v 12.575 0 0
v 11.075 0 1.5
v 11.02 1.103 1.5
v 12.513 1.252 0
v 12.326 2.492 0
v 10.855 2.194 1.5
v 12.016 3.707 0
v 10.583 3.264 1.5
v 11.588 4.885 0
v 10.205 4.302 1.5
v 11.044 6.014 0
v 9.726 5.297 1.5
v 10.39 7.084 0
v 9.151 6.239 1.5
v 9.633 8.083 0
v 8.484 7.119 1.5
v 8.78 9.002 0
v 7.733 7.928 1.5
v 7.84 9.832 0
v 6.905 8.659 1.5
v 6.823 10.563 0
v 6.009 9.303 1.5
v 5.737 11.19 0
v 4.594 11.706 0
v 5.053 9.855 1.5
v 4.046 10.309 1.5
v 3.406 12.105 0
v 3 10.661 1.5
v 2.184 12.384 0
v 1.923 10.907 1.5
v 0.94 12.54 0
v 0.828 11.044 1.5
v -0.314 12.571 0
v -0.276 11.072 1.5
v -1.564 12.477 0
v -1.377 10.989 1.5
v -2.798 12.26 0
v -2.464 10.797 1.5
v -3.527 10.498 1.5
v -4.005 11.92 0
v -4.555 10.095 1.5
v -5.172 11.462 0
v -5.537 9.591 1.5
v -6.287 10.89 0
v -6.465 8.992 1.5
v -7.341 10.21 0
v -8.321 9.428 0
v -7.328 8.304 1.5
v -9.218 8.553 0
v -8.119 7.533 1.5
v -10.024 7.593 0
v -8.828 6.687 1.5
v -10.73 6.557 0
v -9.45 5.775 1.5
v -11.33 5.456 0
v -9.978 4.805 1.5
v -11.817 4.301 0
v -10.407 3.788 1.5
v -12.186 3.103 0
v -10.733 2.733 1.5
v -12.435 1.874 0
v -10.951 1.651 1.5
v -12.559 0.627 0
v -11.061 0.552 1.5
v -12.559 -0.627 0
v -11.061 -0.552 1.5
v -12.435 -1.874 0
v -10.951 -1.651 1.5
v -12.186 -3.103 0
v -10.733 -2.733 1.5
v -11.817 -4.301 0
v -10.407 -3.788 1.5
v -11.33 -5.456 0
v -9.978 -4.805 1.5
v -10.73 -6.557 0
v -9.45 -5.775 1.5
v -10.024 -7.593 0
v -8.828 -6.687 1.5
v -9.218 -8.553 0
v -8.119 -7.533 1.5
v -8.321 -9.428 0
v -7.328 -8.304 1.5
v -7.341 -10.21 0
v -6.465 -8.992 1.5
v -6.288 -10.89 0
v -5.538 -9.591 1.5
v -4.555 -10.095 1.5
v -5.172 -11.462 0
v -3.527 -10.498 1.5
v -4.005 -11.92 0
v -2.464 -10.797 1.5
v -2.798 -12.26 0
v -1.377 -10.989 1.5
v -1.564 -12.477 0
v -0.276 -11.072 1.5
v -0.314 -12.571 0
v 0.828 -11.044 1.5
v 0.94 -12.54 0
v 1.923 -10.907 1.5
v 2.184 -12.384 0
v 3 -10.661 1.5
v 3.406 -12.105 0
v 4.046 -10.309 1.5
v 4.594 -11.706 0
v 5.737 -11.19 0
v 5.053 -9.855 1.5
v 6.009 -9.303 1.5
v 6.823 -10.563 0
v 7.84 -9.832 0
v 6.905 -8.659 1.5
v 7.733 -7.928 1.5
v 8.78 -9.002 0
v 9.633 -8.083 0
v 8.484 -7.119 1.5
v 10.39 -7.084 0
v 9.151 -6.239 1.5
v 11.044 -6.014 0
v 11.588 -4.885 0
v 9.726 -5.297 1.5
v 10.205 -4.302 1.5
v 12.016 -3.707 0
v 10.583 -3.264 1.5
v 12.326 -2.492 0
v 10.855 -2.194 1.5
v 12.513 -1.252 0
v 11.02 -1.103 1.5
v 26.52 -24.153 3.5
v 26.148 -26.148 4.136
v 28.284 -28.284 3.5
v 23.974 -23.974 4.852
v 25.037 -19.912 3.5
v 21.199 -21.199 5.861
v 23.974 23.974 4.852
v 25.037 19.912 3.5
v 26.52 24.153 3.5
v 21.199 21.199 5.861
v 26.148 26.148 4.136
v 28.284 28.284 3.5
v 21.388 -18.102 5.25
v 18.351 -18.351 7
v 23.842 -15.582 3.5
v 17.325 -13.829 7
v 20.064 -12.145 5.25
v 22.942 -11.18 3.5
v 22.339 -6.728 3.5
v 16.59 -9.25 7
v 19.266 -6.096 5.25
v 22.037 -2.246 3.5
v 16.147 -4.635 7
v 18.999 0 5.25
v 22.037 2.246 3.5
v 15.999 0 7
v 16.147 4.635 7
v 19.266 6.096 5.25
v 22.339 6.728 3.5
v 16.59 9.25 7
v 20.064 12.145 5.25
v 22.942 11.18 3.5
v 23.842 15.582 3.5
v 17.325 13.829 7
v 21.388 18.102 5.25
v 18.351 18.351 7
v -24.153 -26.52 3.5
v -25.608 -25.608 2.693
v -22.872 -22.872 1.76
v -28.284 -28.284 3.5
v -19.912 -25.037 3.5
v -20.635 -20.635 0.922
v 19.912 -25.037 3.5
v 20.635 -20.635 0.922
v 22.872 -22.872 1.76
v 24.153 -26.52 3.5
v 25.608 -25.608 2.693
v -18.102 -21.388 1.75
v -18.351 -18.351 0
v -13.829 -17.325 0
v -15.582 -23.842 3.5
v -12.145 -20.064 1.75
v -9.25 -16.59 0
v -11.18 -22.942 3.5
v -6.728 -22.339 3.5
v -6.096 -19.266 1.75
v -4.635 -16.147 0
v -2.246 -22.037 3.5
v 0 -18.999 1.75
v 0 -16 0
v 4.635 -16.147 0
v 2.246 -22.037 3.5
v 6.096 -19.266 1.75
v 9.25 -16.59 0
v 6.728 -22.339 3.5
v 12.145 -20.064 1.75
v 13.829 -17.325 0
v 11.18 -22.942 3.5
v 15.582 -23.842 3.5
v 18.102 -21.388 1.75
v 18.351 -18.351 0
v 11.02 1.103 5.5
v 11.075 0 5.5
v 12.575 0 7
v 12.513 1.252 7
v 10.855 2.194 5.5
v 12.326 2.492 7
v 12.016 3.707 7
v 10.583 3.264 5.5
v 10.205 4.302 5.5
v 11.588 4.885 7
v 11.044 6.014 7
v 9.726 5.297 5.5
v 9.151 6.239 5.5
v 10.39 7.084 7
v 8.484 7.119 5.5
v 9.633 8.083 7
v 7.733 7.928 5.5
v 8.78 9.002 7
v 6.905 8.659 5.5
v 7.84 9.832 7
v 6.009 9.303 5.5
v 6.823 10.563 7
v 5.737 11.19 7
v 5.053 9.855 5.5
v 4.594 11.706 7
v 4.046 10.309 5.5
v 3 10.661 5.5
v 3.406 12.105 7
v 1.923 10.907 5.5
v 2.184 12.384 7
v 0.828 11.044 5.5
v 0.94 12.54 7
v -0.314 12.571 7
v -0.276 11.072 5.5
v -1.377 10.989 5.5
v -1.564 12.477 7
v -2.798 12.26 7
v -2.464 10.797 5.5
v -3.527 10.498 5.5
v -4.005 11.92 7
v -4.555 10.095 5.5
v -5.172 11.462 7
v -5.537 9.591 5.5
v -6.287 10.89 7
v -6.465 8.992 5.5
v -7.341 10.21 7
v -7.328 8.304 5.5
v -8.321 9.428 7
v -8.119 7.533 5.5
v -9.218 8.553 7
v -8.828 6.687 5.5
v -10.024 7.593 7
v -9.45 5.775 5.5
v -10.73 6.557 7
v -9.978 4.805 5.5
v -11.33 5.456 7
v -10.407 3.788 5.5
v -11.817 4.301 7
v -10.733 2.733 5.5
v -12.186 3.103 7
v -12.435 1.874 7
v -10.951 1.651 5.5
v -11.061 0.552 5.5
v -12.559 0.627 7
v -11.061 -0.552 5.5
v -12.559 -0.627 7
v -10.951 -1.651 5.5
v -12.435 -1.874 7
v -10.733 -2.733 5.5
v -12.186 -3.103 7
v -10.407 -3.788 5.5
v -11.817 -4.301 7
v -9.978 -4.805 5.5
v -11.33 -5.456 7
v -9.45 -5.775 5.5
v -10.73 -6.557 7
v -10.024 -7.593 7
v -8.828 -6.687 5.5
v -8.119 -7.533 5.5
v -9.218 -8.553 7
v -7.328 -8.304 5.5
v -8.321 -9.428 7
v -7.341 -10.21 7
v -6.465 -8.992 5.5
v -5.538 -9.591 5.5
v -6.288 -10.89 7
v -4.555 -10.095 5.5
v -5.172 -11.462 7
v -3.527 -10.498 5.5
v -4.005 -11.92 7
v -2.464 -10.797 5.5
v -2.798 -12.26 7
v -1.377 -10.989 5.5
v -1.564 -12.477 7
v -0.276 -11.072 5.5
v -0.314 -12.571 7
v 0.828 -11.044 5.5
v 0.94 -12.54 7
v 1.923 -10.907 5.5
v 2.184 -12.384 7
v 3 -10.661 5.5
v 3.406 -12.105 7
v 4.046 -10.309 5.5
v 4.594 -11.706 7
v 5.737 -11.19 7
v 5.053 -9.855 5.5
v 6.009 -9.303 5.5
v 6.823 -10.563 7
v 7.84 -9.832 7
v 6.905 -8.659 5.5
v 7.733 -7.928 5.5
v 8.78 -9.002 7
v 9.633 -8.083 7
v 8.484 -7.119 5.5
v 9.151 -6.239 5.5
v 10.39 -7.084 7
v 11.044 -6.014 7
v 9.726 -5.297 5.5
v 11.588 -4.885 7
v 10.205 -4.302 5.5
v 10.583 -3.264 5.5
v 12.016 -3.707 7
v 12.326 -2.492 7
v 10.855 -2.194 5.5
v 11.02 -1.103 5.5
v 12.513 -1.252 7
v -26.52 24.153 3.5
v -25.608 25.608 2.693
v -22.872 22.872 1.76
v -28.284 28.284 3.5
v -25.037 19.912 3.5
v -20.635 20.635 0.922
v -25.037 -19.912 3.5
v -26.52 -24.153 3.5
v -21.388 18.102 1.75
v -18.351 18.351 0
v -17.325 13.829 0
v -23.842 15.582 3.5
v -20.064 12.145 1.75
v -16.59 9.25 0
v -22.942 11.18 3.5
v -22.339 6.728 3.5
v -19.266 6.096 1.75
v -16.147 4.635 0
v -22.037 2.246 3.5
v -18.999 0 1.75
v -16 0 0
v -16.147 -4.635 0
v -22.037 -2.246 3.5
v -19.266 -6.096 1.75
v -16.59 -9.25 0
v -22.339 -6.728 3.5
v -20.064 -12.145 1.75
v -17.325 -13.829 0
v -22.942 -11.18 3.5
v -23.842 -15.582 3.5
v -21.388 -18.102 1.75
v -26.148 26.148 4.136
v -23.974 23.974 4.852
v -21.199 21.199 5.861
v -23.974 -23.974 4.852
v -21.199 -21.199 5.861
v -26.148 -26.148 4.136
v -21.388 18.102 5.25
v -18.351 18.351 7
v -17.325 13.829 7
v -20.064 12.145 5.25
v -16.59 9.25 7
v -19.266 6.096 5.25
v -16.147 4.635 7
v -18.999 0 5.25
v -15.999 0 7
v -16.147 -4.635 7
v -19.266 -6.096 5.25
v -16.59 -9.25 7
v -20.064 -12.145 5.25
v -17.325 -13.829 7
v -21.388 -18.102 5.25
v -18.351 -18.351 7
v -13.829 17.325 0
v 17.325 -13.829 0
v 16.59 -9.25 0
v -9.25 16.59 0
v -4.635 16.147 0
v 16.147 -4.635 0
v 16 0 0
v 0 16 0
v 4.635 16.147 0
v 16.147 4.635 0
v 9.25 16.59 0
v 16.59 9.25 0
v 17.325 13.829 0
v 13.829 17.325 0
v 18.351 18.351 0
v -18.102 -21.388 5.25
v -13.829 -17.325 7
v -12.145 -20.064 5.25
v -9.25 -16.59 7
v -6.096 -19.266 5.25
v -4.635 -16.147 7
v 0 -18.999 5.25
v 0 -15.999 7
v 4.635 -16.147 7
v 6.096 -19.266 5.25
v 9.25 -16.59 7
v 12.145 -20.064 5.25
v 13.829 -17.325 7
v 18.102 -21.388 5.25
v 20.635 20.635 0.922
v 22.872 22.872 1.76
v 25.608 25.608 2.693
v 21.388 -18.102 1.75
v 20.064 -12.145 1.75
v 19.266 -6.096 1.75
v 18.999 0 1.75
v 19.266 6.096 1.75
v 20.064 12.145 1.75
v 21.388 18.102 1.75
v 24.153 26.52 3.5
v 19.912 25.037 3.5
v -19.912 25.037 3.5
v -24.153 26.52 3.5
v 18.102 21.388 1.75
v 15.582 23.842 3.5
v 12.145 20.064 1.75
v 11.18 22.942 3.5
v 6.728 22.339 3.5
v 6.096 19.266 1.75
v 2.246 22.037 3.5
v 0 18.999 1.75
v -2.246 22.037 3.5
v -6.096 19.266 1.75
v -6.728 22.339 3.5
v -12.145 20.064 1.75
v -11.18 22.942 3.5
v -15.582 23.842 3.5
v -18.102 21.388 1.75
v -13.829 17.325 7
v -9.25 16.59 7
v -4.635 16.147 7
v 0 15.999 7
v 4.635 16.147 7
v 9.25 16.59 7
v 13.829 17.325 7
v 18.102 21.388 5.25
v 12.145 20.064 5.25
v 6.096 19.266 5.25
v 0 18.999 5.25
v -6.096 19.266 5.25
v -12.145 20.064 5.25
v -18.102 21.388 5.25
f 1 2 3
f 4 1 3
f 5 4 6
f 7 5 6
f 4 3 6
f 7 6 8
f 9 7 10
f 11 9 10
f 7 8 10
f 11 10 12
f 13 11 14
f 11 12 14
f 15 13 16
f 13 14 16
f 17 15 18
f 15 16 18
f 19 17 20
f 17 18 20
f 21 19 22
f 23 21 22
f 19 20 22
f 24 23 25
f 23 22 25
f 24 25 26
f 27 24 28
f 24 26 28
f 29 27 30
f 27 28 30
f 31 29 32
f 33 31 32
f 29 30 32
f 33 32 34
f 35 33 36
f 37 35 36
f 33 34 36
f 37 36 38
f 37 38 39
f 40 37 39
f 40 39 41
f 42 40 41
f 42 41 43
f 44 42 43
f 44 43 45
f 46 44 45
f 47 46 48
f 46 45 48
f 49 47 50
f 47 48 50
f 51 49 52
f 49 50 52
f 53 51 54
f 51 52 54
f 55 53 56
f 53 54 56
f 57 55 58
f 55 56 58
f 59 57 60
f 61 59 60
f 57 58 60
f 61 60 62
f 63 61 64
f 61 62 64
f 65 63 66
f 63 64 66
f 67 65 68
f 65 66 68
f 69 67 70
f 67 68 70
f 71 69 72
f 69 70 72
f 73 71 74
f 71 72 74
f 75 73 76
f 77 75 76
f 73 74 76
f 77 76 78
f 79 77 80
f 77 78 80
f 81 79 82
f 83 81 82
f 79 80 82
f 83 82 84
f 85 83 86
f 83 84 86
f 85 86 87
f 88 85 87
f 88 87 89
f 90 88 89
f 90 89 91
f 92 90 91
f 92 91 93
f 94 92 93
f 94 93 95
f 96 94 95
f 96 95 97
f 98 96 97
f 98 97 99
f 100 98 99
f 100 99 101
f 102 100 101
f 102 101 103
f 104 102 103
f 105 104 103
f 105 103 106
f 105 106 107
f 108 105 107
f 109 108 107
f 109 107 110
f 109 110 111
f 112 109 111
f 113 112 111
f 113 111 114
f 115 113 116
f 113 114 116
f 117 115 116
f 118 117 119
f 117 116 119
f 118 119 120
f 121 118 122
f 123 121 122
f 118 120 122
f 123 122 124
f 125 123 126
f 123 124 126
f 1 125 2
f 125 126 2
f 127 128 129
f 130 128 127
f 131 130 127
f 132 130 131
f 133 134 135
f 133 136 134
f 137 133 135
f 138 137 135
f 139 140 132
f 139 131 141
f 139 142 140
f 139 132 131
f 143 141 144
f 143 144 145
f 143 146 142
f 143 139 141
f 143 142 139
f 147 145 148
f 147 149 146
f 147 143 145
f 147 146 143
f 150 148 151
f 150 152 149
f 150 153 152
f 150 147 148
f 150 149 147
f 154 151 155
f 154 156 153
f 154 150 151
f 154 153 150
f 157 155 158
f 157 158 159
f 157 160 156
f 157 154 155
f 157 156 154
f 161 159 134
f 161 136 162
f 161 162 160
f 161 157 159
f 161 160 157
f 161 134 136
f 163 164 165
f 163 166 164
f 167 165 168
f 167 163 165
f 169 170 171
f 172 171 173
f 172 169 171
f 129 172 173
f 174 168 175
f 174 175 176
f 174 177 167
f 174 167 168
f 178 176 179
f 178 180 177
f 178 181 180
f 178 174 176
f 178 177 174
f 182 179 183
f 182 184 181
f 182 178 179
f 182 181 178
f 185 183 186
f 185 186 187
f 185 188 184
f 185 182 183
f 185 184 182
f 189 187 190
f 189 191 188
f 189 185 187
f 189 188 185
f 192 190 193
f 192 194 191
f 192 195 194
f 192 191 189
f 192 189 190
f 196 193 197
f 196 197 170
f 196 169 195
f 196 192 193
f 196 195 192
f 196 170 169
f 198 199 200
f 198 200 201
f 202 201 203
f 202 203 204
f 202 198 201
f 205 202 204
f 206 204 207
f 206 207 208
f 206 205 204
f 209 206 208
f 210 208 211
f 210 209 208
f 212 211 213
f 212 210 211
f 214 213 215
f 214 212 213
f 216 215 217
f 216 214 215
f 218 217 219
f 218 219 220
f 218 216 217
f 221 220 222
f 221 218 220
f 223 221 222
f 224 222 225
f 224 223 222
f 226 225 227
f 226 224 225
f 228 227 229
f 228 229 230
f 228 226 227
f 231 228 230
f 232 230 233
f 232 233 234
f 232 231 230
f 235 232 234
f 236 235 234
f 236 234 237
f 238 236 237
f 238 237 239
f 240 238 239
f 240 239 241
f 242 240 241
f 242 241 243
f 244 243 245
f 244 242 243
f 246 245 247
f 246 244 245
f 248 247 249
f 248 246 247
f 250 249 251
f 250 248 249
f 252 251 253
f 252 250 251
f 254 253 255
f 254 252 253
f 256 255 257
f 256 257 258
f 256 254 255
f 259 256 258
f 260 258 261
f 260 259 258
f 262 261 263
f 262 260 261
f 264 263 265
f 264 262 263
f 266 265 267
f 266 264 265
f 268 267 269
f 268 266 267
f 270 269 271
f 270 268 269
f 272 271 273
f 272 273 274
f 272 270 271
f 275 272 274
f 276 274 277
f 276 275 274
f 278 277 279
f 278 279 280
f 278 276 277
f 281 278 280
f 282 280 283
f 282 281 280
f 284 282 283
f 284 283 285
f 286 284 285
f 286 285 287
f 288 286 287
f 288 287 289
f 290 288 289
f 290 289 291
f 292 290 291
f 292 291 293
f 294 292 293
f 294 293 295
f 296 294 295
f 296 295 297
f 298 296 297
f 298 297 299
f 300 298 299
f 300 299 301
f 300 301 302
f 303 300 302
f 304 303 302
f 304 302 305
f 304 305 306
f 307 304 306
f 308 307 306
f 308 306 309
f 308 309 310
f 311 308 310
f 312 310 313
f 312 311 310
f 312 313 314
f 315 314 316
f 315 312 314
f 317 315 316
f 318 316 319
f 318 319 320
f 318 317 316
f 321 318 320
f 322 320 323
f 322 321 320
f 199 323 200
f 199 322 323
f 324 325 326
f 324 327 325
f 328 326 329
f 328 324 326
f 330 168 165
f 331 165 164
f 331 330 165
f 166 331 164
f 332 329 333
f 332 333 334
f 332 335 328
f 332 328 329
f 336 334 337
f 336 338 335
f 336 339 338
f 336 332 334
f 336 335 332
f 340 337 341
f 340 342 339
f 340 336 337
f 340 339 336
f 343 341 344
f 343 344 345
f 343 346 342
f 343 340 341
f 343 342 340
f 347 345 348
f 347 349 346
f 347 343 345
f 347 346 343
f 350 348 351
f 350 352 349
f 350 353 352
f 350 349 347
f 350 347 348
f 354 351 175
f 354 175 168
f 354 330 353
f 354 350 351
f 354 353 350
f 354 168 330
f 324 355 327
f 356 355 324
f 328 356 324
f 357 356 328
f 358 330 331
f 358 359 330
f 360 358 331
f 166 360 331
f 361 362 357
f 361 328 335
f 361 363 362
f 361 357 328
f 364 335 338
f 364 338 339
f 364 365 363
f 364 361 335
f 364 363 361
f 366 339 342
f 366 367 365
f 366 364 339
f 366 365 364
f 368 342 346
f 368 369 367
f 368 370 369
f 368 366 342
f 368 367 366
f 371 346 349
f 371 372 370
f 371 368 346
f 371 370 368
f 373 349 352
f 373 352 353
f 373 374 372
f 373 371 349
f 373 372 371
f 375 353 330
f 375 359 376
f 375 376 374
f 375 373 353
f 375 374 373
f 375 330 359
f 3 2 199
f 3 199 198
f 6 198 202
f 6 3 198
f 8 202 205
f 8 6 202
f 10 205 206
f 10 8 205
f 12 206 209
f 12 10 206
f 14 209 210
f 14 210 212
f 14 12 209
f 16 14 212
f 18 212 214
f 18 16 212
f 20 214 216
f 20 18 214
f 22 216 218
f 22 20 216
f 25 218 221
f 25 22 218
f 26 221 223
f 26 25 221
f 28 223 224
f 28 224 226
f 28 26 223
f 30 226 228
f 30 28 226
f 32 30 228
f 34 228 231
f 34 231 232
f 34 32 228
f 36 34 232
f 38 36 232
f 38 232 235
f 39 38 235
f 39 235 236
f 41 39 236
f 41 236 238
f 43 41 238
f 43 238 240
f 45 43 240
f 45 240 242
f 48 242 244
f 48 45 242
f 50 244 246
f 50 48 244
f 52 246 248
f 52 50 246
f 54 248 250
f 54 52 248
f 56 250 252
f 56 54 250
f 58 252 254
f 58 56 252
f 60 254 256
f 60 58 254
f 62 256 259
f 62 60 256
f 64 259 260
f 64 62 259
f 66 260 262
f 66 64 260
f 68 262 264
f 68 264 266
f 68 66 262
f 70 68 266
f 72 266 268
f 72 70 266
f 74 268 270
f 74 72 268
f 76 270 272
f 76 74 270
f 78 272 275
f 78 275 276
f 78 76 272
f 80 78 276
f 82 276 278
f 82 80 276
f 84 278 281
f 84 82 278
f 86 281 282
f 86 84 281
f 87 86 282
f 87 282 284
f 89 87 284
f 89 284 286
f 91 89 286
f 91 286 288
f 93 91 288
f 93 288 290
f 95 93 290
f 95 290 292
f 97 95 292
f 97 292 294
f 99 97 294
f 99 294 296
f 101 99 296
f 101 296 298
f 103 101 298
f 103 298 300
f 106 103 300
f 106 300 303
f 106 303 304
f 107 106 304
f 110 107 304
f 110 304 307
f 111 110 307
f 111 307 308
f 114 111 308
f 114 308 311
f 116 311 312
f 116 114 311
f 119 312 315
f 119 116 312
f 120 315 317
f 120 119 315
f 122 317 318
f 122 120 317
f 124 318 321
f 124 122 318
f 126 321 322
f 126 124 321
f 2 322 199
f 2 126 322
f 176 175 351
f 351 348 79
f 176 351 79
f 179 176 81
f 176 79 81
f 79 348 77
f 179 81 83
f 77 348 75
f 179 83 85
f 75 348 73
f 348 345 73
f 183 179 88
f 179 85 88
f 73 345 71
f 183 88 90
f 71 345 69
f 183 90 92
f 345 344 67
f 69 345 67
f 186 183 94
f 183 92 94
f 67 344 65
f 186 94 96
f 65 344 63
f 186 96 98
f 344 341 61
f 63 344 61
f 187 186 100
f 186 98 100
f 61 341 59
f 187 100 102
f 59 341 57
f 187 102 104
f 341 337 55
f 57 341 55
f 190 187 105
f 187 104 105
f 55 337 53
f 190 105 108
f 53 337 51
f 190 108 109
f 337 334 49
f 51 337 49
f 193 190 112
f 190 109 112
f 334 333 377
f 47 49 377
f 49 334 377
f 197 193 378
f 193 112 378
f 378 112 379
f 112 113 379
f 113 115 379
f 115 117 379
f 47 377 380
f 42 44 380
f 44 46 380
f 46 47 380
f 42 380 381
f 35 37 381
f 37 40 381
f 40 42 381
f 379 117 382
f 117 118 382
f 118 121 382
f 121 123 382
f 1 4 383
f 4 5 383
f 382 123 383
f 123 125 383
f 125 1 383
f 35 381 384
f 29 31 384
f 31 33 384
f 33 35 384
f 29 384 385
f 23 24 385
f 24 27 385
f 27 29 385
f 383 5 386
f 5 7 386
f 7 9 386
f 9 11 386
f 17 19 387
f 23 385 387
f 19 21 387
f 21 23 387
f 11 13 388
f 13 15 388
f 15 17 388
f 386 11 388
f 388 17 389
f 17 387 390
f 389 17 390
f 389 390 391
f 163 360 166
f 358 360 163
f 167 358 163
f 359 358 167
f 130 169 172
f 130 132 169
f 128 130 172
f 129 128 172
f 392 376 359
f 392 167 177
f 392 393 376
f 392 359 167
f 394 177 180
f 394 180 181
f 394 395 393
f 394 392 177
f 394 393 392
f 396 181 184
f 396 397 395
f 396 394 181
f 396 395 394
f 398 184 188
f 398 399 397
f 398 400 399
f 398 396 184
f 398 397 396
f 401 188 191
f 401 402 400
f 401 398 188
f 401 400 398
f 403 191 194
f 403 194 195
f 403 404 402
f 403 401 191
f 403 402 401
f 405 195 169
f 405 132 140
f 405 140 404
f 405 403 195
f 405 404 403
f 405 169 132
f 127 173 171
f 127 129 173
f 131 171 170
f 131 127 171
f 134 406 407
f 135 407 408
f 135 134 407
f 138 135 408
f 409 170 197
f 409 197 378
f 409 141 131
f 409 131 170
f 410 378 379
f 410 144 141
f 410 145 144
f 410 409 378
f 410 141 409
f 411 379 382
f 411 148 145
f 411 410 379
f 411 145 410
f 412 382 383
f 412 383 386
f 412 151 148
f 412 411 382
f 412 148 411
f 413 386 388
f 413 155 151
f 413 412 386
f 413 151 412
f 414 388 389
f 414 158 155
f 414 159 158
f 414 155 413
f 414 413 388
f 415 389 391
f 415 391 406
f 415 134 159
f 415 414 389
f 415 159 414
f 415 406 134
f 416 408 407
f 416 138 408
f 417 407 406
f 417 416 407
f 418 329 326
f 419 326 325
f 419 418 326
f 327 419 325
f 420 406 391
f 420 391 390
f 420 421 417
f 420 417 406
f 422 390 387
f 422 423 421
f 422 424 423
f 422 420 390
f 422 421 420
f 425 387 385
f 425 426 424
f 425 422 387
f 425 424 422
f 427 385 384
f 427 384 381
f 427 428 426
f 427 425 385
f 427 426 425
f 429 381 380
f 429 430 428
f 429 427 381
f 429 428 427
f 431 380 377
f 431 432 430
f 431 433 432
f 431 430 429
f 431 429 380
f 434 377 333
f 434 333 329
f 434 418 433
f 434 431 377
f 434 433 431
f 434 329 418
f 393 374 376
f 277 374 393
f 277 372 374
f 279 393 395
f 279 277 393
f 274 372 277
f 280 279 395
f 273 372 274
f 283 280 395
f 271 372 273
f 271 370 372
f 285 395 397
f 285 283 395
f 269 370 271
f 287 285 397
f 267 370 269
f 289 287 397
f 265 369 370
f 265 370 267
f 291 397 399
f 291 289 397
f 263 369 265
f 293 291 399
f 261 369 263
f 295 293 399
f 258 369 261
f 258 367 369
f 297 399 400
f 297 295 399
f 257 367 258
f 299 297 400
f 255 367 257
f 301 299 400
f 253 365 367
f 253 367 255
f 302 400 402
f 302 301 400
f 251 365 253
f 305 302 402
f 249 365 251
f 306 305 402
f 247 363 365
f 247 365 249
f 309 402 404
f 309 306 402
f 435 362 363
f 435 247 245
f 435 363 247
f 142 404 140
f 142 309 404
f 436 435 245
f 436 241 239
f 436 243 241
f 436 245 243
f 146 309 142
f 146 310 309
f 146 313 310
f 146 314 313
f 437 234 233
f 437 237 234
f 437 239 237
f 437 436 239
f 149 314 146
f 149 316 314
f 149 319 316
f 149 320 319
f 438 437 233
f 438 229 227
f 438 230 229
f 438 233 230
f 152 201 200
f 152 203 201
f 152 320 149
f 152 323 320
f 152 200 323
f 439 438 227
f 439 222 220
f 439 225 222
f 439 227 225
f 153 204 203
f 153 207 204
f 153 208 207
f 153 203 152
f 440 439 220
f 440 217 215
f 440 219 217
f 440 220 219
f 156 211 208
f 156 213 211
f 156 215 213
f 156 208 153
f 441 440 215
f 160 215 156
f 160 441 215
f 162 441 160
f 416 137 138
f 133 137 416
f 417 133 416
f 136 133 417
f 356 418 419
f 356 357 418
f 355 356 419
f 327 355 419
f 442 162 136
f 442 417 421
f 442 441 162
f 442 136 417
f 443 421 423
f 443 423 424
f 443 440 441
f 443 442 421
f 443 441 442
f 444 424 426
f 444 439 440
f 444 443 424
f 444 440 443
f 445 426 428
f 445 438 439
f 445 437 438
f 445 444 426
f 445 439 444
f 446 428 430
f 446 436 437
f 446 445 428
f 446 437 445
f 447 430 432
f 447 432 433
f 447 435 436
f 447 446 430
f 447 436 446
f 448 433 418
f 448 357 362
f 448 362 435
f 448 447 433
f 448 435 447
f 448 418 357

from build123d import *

# Parameters (mm, degrees)
F0_R     = 11.075
F1_DEPTH = 7
F2_SIZE2 = 6
F2_SIZE  = 3.5
F3_SIZE2 = 3.49999
F3_SIZE  = 5.99999
F4_SIZE  = 1.5


# Not quite as in the source:
# - a fillet or chamfer is up to 0.001 mm smaller than in the source, because OpenCascade refuses the exact size


with BuildPart() as f1:
    # F0 (on Top) → F1 (new body)
    with BuildSketch(Plane.XY):
        with BuildLine():
            ThreePointArc((28.2842712475, -28.2842712475), (21.9994915516, 0), (28.2842712475, 28.2842712475))
            ThreePointArc((28.2842712475, 28.2842712475), (0, 21.9994915516), (-28.2842712475, 28.2842712475))
            ThreePointArc((-28.2842712475, 28.2842712475), (-21.9994915516, 0), (-28.2842712475, -28.2842712475))
            ThreePointArc((-28.2842712475, -28.2842712475), (0, -21.9994915516), (28.2842712475, -28.2842712475))
        make_face()
        Circle(F0_R, mode=Mode.SUBTRACT)
    extrude(amount=F1_DEPTH)

    # F2
    f2_edges = [f1.edges().sort_by_distance(p)[0] for p in [
        (0, -21.999492, 7),
        (-21.999492, 0, 7),
        (0, 21.999492, 7),
        (21.999492, 0, 7),
    ]]
    chamfer(f2_edges, length=F2_SIZE, length2=F2_SIZE2)

    # F3 (size 6 and 3.5 in the source; OpenCascade refuses exactly that, so slightly less here)
    f3_edges = [f1.edges().sort_by_distance(p)[0] for p in [
        (-21.999492, 0, 0),
        (0, -21.999492, 0),
        (21.999492, 0, 0),
        (0, 21.999492, 0),
    ]]
    f3_side = f1.faces().sort_by_distance((0, -21.199492, 0))[0]
    chamfer(f3_edges, length=F3_SIZE, length2=F3_SIZE2, reference=f3_side)

    # F4
    f4_edges = [f1.edges().sort_by_distance(p)[0] for p in [
        (-11.075, 0, 0),
        (-11.075, 0, 7),
    ]]
    chamfer(f4_edges, length=F4_SIZE)


solid = f1.part
